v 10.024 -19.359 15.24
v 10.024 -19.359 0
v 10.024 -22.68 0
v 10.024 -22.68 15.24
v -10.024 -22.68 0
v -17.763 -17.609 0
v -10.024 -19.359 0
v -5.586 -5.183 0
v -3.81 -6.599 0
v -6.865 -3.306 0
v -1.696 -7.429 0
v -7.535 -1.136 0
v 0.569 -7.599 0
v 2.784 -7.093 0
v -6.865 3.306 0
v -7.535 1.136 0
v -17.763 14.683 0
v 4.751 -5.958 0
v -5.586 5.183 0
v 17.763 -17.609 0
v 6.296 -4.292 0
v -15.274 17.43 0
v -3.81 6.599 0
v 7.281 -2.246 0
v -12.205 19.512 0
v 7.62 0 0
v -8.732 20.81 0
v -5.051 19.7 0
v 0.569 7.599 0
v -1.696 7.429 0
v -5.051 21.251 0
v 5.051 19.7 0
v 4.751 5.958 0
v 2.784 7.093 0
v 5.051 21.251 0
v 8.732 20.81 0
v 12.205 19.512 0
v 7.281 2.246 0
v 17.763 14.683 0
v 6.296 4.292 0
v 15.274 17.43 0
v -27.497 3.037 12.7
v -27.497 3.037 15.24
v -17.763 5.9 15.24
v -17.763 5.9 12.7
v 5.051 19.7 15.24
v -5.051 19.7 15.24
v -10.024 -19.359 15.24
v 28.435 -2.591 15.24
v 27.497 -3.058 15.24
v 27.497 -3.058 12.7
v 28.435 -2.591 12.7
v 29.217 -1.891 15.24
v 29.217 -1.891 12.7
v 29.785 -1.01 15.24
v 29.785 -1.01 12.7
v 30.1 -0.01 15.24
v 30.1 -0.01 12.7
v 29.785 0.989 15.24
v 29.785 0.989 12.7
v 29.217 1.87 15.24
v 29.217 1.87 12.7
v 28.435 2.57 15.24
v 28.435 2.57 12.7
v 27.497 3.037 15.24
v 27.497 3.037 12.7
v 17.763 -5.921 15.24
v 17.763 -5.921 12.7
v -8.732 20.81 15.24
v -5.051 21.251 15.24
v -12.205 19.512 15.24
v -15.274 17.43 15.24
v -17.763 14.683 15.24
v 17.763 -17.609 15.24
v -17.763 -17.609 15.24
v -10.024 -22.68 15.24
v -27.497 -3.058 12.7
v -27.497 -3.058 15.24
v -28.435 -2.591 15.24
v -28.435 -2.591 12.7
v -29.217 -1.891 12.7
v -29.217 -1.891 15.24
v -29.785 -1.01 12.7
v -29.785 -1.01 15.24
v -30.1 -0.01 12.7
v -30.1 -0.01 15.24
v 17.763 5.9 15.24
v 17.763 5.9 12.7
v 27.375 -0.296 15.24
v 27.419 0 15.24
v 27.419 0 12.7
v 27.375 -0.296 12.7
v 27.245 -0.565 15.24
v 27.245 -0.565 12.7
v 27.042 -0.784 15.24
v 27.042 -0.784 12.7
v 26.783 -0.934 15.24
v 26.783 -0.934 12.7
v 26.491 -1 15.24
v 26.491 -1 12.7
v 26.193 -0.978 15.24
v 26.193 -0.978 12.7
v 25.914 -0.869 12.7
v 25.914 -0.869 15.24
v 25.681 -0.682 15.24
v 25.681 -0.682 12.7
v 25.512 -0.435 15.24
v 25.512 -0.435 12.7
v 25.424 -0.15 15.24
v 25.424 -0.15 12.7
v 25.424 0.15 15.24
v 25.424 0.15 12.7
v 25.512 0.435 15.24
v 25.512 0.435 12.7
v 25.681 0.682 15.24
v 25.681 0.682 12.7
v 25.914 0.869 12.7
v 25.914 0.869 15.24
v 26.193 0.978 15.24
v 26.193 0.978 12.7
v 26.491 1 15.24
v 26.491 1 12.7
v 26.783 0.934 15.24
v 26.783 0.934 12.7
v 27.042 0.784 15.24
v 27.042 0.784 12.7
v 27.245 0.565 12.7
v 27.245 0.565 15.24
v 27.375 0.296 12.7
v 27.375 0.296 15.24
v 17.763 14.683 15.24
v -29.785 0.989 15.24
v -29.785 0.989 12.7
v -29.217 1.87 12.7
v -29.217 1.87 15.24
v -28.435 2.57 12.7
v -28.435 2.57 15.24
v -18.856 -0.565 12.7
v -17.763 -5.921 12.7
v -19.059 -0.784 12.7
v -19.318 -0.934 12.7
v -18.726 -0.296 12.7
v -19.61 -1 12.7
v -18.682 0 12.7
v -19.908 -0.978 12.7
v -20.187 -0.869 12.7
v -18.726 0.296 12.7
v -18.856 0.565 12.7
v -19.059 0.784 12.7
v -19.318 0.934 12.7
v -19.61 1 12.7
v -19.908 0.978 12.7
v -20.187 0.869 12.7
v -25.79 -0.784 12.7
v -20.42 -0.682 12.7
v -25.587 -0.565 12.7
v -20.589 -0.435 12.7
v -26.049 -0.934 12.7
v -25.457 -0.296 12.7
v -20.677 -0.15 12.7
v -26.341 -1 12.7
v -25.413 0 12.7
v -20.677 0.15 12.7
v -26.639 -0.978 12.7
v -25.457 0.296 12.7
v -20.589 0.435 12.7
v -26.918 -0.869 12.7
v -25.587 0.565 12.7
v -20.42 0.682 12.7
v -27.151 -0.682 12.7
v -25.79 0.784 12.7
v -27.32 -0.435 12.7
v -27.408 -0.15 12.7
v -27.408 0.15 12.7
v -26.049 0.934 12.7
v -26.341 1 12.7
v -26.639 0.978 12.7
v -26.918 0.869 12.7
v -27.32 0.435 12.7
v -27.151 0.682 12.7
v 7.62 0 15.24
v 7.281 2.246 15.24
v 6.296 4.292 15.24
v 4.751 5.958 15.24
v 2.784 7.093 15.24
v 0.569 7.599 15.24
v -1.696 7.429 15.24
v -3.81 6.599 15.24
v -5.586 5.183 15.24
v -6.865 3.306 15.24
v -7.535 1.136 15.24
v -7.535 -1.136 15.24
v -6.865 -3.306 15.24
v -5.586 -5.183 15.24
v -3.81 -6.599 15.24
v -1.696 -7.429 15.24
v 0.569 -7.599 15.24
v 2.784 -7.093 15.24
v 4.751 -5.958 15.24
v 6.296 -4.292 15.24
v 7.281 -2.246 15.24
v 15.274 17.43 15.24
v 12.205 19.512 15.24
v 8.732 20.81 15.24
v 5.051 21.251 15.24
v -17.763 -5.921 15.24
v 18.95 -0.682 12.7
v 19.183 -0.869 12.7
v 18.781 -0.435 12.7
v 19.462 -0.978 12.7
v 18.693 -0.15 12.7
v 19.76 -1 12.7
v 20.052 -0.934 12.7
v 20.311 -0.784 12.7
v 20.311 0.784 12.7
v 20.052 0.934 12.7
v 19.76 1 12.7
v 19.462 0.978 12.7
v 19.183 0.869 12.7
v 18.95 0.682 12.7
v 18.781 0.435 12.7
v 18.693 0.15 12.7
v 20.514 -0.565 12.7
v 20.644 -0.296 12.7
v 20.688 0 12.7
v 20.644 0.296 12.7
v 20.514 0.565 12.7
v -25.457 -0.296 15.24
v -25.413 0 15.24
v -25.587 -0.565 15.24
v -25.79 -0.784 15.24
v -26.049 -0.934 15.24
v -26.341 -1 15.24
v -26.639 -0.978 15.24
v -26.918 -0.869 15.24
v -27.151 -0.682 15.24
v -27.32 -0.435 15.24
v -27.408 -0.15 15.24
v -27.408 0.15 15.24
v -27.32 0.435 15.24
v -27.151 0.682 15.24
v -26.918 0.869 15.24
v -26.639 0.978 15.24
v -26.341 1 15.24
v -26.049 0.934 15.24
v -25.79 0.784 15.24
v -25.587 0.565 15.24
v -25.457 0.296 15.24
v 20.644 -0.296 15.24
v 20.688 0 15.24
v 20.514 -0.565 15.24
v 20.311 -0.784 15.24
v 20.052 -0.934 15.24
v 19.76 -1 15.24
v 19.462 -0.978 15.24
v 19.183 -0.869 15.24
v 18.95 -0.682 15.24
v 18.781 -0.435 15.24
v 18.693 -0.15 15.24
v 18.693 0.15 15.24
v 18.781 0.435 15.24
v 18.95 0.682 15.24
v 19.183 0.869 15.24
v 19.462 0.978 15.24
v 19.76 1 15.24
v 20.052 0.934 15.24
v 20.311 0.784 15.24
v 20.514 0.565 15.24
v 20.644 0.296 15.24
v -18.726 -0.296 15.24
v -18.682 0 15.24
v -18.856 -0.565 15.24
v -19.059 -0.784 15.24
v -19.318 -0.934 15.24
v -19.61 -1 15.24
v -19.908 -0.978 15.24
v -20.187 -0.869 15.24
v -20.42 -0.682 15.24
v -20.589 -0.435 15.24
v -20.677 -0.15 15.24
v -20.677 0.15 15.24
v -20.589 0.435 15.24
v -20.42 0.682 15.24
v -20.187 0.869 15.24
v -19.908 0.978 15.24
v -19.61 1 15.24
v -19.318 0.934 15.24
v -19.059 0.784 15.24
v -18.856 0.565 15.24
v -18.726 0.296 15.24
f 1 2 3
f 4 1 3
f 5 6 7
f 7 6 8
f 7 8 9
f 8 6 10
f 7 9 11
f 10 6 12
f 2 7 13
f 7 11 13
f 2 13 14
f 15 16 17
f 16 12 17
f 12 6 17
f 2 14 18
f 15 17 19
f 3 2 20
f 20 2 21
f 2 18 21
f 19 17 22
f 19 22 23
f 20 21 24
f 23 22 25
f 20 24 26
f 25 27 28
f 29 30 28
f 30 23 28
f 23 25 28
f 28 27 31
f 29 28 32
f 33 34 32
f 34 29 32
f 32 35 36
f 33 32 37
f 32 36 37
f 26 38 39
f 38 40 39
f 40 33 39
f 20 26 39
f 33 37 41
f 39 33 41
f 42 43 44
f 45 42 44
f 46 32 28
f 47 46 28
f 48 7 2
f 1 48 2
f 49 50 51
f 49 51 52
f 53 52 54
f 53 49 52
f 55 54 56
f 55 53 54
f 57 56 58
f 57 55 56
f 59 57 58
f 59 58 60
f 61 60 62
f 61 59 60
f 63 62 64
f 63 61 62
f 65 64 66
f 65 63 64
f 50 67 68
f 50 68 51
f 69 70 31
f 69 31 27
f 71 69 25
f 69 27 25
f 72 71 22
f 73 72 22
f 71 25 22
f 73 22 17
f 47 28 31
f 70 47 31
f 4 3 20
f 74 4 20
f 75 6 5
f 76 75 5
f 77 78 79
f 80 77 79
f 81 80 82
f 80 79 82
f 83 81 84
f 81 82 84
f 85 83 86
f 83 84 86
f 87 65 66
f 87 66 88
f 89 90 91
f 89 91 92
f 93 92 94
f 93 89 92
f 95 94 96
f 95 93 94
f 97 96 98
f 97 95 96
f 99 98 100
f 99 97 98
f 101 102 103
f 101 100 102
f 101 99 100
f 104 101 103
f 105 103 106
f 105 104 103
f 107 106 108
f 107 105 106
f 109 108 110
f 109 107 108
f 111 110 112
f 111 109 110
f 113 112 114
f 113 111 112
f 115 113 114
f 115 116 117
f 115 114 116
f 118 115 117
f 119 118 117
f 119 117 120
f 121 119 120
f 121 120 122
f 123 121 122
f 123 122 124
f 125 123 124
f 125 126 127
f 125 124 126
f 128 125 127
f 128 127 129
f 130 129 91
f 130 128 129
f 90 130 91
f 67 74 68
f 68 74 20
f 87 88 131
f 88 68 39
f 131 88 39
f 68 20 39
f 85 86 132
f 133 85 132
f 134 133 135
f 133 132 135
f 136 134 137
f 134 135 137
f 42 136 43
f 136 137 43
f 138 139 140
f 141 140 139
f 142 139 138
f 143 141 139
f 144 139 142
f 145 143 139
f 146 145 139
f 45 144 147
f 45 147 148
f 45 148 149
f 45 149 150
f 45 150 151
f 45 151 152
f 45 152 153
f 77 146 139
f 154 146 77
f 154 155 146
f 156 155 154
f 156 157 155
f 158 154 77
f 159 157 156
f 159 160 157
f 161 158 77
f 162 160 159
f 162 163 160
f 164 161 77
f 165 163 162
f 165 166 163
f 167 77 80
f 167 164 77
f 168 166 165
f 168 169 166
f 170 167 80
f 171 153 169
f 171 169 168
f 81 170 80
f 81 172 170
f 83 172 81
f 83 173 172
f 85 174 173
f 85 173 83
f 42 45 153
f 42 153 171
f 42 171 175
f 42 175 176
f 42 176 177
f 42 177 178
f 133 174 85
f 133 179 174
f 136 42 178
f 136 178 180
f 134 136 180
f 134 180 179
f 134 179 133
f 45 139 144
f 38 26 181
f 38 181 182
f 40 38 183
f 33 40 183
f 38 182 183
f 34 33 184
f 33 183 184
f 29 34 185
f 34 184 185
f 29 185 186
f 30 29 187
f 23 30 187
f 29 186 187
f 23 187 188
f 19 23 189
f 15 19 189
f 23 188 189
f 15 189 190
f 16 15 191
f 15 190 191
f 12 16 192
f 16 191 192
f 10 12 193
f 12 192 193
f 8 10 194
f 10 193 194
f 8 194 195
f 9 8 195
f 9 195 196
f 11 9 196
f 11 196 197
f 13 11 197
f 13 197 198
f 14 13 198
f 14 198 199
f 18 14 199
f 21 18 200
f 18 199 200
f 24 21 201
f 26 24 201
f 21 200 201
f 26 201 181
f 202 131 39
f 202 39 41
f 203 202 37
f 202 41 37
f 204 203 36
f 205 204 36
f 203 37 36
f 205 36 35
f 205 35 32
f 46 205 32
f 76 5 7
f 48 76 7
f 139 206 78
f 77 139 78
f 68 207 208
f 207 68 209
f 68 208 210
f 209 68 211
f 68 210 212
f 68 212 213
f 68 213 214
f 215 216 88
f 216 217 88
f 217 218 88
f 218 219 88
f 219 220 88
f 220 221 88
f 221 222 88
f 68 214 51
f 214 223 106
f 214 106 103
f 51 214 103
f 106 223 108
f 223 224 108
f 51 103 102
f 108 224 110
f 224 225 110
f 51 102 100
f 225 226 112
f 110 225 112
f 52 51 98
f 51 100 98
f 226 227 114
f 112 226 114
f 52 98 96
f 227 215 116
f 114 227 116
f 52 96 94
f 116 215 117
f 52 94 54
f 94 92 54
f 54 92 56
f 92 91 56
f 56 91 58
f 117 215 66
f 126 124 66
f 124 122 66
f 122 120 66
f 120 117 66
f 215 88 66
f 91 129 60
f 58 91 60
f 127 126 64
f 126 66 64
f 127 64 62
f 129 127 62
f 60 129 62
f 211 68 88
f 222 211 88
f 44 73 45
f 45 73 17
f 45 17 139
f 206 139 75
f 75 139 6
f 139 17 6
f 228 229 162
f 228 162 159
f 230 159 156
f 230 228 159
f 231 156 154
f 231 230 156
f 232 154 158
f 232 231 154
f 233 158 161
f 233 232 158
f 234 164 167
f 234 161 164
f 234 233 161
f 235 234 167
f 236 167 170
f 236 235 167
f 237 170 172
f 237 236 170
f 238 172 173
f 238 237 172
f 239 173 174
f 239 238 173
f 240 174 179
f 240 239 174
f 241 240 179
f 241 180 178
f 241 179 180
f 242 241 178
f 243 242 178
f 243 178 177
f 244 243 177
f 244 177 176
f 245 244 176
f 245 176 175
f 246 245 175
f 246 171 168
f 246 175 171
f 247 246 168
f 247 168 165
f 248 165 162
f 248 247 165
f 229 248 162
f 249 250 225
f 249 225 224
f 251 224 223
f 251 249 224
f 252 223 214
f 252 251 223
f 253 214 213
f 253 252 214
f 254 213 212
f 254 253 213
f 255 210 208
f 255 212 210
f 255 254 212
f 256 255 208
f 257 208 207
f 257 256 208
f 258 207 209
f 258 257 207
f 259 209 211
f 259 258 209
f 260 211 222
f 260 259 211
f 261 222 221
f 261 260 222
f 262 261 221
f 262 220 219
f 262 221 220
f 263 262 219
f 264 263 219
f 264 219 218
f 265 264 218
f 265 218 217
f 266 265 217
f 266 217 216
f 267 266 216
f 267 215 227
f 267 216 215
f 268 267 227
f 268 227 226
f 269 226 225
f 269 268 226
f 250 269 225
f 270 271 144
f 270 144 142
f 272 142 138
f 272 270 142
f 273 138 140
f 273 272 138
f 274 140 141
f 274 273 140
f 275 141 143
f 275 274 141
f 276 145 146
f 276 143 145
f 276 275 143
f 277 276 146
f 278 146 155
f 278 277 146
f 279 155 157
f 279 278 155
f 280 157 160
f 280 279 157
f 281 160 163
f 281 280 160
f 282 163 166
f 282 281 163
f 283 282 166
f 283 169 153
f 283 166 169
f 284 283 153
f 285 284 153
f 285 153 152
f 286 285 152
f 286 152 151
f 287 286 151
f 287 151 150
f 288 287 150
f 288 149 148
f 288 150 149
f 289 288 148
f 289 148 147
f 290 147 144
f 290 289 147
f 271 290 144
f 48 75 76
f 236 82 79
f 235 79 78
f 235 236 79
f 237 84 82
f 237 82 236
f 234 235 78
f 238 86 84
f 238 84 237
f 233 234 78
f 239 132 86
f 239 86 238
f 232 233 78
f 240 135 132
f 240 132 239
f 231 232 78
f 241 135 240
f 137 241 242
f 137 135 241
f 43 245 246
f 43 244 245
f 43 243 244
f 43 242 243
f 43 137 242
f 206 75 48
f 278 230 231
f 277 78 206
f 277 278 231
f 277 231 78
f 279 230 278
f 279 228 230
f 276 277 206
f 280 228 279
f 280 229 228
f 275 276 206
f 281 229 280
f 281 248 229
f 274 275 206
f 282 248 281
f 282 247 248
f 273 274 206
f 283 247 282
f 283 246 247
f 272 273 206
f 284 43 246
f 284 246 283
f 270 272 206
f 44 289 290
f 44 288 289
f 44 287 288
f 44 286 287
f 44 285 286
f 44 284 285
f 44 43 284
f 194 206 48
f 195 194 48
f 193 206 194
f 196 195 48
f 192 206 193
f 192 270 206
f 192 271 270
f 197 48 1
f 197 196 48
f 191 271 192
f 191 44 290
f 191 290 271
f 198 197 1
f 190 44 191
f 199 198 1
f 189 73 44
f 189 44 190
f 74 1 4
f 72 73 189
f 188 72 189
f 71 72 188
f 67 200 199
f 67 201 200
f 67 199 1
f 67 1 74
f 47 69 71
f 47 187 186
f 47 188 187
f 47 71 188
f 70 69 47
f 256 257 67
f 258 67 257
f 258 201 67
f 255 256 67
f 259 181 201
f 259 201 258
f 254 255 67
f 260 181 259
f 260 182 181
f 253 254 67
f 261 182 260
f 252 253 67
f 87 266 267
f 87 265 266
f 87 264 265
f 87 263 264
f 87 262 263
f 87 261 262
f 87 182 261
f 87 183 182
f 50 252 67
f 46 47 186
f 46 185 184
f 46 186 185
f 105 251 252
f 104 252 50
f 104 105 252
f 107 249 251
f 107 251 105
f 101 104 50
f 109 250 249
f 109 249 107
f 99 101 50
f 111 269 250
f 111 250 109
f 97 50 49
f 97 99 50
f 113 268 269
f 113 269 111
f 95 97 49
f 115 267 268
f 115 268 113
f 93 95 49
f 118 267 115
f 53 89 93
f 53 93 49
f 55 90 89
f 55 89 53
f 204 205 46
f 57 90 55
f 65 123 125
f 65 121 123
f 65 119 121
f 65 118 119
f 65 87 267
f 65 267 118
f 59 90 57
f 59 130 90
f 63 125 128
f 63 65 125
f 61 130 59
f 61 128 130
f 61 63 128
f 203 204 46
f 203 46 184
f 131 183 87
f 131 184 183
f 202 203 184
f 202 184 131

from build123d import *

# Parameters (mm, degrees)
BOSS_EXTRUDE2_DEPTH     = 15.24
SKETCH5_R               = 7.62
CUT_EXTRUDE2_DEPTH      = 15.24
BOSS_EXTRUDE3_DEPTH     = 2.54
CUT_EXTRUDE5_DEPTH      = 41.652633663
CUT_EXTRUDE5_DEPTH_BACK = 41.652633663
SKETCH7_R               = 1.0033


with BuildPart() as part:
    # Sketch1 → Boss-Extrude2 (new body)
    with BuildSketch(Plane.XY):
        with BuildLine():
            Line((-17.763499893, 14.683044609), (-17.763499893, -17.608986031))
            Line((-17.763499893, -17.608986031), (-10.024087591, -22.679635471))
            Line((-10.024087591, -22.679635471), (-10.024087591, -19.359490178))
            Line((-10.024087591, -19.359490178), (10.024087591, -19.359490178))
            Line((10.024087591, -19.359490178), (10.024087591, -22.679635471))
            Line((10.024087591, -22.679635471), (17.763499893, -17.608986031))
            Line((17.763499893, -17.608986031), (17.763499893, 14.683044609))
            ThreePointArc((17.763499893, 14.683044609), (12.2054587, 19.511759091), (5.051122326, 21.250660037))
            Line((5.051122326, 21.250660037), (5.051122326, 19.699745061))
            Line((5.051122326, 19.699745061), (-5.051122326, 19.699745061))
            Line((-5.051122326, 19.699745061), (-5.051122326, 21.250660037))
            ThreePointArc((-5.051122326, 21.250660037), (-12.2054587, 19.511759091), (-17.763499893, 14.683044609))
        make_face()
    extrude(amount=BOSS_EXTRUDE2_DEPTH)

    # Sketch5 → Cut-Extrude2 (cut)
    with BuildSketch(Plane.XY.offset(15.24)):
        Circle(SKETCH5_R)
    extrude(amount=-CUT_EXTRUDE2_DEPTH, mode=Mode.SUBTRACT)

    # Sketch6 → Boss-Extrude3 (add)
    with BuildSketch(Plane.XY.offset(15.24)):
        with BuildLine():
            Line((-27.497120647, 3.03730764), (-17.763499893, 5.900096548))
            Line((-17.763499893, 5.900096548), (-17.763499893, -5.920973667))
            Line((-17.763499893, -5.920973667), (-27.497120647, -3.058184758))
            ThreePointArc((-27.497120647, -3.058184758), (-29.216566103, -1.891287663), (-30.10005247, -0.010438559))
            ThreePointArc((-30.10005247, -0.010438559), (-29.216566103, 1.870410544), (-27.497120647, 3.03730764))
        make_face()
        with BuildLine():
            Line((27.497120647, 3.03730764), (17.763499893, 5.900096548))
            Line((17.763499893, 5.900096548), (17.763499893, -5.920973667))
            Line((17.763499893, -5.920973667), (27.497120647, -3.058184758))
            ThreePointArc((27.497120647, -3.058184758), (29.216566103, -1.891287663), (30.10005247, -0.010438559))
            ThreePointArc((30.10005247, -0.010438559), (29.216566103, 1.870410544), (27.497120647, 3.03730764))
        make_face()
    extrude(amount=-BOSS_EXTRUDE3_DEPTH)

    # Sketch7 → Cut-Extrude5 (cut, two sides: drawn at the far end of the back side and taken through both)
    with BuildSketch(Plane(origin=(0, 0, 0), x_dir=(-1, 0, 0), z_dir=(0, 0, -1)).offset(-CUT_EXTRUDE5_DEPTH_BACK)):
        with Locations(Location((-19.685, 0, 0), (0, 0, 180))):
            Circle(SKETCH7_R)
        with Locations(Location((-26.416, 0, 0), (0, 0, 180))):
            Circle(SKETCH7_R)
        with Locations(Location((19.685, 0, 0), (0, 0, 180))):
            Circle(SKETCH7_R)
        with Locations(Location((26.416, 0, 0), (0, 0, 180))):
            Circle(SKETCH7_R)
    extrude(amount=CUT_EXTRUDE5_DEPTH + CUT_EXTRUDE5_DEPTH_BACK, mode=Mode.SUBTRACT)


solid = part.part
